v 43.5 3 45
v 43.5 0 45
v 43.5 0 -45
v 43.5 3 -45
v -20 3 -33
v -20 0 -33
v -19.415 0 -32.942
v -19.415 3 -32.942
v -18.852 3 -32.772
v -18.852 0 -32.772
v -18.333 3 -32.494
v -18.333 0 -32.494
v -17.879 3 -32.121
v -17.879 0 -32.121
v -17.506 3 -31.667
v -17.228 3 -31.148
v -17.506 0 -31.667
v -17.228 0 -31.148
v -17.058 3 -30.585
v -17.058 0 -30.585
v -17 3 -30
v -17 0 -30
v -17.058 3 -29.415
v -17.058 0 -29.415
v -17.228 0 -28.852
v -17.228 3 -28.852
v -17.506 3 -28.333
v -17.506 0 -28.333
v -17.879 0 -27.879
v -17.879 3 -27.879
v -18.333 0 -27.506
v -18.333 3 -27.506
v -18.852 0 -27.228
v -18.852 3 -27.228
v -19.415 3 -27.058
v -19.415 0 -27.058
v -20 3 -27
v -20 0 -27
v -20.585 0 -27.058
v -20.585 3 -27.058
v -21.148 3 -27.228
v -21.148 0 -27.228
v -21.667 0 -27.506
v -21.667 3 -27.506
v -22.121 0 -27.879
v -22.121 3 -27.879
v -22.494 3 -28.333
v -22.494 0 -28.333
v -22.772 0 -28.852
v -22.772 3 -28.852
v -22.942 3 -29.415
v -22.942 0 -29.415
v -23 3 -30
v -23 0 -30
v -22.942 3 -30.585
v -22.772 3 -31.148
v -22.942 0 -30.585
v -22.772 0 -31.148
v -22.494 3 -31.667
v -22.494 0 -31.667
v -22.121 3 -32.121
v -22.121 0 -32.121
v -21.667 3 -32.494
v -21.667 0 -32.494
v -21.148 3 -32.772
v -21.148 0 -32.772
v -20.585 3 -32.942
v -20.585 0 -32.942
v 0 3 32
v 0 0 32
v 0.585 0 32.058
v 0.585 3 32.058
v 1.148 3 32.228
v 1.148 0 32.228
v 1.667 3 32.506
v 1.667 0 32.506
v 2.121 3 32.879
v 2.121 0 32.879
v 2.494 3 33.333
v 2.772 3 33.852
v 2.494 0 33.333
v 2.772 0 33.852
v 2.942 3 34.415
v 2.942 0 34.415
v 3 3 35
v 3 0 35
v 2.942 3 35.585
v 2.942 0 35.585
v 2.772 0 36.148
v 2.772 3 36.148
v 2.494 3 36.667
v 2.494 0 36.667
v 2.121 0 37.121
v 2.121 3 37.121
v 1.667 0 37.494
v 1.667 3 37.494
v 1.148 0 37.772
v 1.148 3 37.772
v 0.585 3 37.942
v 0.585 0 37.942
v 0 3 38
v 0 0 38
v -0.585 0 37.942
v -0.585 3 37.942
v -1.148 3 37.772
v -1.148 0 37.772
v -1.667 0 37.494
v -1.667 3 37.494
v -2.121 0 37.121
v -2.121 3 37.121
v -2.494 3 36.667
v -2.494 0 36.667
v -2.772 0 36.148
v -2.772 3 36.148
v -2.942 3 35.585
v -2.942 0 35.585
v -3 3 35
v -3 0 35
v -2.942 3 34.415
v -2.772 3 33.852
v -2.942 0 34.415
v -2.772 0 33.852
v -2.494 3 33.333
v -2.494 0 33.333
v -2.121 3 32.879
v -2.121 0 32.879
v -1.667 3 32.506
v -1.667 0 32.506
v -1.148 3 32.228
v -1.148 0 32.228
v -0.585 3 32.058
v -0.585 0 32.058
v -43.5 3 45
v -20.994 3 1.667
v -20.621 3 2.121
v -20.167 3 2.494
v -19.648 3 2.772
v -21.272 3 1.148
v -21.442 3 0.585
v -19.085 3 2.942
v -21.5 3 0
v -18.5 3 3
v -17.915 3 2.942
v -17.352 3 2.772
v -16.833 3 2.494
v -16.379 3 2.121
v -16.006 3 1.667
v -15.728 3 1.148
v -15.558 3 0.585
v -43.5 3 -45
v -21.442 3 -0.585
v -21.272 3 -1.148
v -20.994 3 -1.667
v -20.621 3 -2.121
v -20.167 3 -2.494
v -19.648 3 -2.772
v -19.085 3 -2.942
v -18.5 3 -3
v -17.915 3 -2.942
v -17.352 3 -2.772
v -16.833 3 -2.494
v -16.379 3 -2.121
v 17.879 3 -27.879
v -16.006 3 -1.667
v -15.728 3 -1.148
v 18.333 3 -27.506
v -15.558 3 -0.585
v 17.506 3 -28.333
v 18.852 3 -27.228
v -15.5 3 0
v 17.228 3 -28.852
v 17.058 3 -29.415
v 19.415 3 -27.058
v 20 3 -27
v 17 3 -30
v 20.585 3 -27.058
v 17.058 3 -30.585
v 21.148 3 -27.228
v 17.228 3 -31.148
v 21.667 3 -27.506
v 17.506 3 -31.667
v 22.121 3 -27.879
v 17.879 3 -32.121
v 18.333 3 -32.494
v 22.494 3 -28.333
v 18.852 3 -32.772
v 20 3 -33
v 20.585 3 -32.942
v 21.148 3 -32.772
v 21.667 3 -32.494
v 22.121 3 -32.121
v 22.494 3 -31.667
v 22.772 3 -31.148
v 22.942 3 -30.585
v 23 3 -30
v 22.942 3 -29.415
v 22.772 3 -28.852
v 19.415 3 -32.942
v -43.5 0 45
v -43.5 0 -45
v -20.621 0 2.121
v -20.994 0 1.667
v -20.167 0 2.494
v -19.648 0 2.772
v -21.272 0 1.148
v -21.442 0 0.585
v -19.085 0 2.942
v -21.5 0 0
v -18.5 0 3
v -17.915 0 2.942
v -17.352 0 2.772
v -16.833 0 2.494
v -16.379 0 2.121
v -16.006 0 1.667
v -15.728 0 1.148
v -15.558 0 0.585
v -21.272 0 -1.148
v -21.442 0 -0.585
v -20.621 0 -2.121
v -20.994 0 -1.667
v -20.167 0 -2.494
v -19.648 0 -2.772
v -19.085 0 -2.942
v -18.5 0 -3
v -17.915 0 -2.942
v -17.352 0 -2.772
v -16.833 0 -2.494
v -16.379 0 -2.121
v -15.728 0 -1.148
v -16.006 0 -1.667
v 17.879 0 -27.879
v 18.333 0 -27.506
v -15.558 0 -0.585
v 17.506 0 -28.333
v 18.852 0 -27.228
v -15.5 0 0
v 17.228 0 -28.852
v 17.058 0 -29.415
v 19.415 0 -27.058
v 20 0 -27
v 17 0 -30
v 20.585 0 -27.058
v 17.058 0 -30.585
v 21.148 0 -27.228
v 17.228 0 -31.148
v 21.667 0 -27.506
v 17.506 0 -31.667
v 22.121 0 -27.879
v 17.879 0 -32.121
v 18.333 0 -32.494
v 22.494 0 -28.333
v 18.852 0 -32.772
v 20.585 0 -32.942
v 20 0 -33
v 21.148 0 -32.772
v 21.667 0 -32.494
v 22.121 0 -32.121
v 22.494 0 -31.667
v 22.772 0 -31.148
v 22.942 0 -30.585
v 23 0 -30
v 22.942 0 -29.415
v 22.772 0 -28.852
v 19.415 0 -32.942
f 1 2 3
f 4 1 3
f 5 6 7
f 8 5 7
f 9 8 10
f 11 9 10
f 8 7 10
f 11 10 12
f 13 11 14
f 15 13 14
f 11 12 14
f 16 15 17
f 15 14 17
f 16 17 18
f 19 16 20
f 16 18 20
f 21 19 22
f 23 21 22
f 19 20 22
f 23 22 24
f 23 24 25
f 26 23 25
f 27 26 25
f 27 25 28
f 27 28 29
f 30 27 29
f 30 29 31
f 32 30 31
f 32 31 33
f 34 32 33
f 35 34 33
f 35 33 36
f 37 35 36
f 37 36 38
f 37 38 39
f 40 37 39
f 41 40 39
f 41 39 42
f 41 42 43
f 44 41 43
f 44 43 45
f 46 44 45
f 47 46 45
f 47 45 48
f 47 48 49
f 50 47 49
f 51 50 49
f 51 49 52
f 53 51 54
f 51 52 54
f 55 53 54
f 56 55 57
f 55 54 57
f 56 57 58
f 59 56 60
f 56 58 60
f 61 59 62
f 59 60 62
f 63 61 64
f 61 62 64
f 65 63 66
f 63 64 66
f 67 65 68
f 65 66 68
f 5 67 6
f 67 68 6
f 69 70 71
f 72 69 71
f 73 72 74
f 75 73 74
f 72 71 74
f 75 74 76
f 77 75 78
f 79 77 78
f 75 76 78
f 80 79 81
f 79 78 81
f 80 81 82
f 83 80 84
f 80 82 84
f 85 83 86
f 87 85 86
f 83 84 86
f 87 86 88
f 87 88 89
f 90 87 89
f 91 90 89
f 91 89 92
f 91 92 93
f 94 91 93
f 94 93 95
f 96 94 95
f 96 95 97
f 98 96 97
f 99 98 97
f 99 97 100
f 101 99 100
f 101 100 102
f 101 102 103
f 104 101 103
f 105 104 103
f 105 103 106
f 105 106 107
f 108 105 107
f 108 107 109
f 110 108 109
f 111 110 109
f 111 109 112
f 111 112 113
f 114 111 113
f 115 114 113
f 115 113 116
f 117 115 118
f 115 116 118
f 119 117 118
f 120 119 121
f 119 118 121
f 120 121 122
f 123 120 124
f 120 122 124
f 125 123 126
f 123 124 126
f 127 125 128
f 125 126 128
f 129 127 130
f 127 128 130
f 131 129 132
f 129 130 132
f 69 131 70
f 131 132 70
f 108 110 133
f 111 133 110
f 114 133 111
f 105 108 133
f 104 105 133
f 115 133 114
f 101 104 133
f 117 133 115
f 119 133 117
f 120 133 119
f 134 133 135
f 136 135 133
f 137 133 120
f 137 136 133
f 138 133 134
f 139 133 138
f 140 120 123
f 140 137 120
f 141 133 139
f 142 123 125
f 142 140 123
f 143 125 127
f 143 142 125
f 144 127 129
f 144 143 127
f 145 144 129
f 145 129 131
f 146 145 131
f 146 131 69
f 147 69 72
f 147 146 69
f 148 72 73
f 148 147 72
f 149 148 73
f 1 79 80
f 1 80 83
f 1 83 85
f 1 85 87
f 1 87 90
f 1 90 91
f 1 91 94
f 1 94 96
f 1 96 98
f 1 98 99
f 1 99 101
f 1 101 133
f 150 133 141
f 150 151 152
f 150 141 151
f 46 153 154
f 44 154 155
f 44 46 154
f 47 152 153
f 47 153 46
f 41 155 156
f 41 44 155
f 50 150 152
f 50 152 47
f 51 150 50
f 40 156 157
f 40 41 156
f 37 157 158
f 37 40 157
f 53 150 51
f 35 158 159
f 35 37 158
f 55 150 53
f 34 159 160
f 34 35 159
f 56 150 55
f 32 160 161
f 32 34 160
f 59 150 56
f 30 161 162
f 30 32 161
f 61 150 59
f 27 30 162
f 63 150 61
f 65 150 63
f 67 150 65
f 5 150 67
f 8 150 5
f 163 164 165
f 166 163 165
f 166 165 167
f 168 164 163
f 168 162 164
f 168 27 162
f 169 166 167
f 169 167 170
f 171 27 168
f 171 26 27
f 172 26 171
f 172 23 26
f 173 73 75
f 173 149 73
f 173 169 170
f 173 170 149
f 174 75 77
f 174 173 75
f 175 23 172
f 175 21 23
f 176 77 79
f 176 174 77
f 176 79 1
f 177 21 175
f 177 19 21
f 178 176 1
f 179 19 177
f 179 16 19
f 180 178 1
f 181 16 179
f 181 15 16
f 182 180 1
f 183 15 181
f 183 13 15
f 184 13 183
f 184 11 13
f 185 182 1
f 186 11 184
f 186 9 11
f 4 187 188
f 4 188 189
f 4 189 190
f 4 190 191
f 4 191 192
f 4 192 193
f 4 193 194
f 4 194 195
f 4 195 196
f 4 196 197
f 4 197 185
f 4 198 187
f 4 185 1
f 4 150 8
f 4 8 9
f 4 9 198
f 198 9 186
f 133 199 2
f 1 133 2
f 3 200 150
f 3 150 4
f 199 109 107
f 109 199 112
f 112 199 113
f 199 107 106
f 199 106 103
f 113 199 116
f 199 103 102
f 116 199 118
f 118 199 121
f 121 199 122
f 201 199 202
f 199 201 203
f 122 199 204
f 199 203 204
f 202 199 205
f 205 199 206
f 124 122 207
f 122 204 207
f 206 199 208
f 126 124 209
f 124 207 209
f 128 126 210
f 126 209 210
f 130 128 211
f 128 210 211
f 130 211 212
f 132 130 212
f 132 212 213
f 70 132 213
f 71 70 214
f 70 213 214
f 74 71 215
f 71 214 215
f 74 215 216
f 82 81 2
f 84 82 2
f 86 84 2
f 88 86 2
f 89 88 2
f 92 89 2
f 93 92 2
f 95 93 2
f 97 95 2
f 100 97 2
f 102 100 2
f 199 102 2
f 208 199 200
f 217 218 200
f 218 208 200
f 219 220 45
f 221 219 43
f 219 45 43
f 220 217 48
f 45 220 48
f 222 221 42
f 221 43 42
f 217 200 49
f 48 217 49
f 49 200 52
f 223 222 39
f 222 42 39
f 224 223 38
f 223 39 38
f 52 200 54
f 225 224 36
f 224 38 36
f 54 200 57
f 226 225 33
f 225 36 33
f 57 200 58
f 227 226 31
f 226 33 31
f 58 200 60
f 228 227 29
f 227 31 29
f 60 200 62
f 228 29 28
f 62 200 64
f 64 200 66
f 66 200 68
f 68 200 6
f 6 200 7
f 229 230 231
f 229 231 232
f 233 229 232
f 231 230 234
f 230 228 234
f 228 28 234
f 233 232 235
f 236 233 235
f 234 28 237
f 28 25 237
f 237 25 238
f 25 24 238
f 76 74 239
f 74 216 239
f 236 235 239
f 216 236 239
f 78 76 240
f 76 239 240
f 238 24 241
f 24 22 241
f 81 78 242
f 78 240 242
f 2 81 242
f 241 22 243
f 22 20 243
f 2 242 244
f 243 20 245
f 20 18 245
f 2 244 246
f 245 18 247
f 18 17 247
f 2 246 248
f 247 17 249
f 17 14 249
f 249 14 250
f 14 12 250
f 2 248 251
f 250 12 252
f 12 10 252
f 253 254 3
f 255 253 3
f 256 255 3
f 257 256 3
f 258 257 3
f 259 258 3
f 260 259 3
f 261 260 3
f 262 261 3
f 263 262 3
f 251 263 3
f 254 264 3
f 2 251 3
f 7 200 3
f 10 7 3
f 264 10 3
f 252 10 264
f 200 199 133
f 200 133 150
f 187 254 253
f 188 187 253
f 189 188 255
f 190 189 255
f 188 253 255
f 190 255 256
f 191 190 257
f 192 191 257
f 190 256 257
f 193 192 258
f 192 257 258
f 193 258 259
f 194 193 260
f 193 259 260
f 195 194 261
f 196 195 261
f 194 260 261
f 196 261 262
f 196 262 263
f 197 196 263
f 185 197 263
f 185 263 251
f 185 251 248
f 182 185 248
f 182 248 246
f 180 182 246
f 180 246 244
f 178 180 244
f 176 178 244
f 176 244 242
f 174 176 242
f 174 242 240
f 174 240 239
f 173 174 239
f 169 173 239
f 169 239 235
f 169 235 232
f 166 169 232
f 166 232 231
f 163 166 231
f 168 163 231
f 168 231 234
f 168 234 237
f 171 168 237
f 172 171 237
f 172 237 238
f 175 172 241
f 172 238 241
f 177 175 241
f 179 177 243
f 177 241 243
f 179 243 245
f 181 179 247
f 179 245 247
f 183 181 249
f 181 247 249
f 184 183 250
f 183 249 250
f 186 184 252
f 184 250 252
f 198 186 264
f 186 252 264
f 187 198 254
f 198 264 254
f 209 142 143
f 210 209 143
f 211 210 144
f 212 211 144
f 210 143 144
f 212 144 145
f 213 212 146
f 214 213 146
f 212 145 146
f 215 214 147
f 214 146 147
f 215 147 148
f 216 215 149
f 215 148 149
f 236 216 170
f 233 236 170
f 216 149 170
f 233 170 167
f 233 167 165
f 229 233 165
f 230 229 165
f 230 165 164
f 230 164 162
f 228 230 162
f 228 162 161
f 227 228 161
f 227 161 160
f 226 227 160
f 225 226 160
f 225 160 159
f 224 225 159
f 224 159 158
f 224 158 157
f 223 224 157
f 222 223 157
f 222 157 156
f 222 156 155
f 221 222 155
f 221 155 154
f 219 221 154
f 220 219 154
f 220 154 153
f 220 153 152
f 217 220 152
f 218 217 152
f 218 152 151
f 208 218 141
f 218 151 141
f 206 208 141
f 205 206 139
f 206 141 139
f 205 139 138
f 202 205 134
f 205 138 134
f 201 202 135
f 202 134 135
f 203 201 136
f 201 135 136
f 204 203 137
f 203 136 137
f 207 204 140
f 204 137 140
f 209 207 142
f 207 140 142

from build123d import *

# Parameters (mm, degrees)
SKETCH1_W           = 87
SKETCH1_H           = 90
BOSS_EXTRUDE1_DEPTH = 3
SKETCH2_R           = 3
CUT_EXTRUDE1_DEPTH  = 63.659795723
SKETCH3_R           = 3
CUT_EXTRUDE2_DEPTH  = 63.659795723


with BuildPart() as part:
    # Sketch1 → Boss-Extrude1 (new body)
    with BuildSketch(Plane(origin=(0, 0, 0), x_dir=(1, 0, 0), z_dir=(0, 1, 0))):
        Rectangle(SKETCH1_W, SKETCH1_H)
    extrude(amount=BOSS_EXTRUDE1_DEPTH)

    # Sketch2 → Cut-Extrude1 (cut, through all)
    with BuildSketch(Plane(origin=(0, 3, 0), x_dir=(1, 0, 0), z_dir=(0, 1, 0))):
        with Locations(Location((-18.5, 0, 0), (0, 0, 270))):
            Circle(SKETCH2_R)
    extrude(amount=-CUT_EXTRUDE1_DEPTH, mode=Mode.SUBTRACT)

    # Sketch3 → Cut-Extrude2 (cut, through all)
    with BuildSketch(Plane.XZ):
        with Locations(Location((0, 35, 0), (0, 0, 270))):
            Circle(SKETCH3_R)
        with Locations(Location((-20, -30, 0), (0, 0, 270))):
            Circle(SKETCH3_R)
        with Locations(Location((20, -30, 0), (0, 0, 270))):
            Circle(SKETCH3_R)
    extrude(amount=-CUT_EXTRUDE2_DEPTH, mode=Mode.SUBTRACT)


solid = part.part
